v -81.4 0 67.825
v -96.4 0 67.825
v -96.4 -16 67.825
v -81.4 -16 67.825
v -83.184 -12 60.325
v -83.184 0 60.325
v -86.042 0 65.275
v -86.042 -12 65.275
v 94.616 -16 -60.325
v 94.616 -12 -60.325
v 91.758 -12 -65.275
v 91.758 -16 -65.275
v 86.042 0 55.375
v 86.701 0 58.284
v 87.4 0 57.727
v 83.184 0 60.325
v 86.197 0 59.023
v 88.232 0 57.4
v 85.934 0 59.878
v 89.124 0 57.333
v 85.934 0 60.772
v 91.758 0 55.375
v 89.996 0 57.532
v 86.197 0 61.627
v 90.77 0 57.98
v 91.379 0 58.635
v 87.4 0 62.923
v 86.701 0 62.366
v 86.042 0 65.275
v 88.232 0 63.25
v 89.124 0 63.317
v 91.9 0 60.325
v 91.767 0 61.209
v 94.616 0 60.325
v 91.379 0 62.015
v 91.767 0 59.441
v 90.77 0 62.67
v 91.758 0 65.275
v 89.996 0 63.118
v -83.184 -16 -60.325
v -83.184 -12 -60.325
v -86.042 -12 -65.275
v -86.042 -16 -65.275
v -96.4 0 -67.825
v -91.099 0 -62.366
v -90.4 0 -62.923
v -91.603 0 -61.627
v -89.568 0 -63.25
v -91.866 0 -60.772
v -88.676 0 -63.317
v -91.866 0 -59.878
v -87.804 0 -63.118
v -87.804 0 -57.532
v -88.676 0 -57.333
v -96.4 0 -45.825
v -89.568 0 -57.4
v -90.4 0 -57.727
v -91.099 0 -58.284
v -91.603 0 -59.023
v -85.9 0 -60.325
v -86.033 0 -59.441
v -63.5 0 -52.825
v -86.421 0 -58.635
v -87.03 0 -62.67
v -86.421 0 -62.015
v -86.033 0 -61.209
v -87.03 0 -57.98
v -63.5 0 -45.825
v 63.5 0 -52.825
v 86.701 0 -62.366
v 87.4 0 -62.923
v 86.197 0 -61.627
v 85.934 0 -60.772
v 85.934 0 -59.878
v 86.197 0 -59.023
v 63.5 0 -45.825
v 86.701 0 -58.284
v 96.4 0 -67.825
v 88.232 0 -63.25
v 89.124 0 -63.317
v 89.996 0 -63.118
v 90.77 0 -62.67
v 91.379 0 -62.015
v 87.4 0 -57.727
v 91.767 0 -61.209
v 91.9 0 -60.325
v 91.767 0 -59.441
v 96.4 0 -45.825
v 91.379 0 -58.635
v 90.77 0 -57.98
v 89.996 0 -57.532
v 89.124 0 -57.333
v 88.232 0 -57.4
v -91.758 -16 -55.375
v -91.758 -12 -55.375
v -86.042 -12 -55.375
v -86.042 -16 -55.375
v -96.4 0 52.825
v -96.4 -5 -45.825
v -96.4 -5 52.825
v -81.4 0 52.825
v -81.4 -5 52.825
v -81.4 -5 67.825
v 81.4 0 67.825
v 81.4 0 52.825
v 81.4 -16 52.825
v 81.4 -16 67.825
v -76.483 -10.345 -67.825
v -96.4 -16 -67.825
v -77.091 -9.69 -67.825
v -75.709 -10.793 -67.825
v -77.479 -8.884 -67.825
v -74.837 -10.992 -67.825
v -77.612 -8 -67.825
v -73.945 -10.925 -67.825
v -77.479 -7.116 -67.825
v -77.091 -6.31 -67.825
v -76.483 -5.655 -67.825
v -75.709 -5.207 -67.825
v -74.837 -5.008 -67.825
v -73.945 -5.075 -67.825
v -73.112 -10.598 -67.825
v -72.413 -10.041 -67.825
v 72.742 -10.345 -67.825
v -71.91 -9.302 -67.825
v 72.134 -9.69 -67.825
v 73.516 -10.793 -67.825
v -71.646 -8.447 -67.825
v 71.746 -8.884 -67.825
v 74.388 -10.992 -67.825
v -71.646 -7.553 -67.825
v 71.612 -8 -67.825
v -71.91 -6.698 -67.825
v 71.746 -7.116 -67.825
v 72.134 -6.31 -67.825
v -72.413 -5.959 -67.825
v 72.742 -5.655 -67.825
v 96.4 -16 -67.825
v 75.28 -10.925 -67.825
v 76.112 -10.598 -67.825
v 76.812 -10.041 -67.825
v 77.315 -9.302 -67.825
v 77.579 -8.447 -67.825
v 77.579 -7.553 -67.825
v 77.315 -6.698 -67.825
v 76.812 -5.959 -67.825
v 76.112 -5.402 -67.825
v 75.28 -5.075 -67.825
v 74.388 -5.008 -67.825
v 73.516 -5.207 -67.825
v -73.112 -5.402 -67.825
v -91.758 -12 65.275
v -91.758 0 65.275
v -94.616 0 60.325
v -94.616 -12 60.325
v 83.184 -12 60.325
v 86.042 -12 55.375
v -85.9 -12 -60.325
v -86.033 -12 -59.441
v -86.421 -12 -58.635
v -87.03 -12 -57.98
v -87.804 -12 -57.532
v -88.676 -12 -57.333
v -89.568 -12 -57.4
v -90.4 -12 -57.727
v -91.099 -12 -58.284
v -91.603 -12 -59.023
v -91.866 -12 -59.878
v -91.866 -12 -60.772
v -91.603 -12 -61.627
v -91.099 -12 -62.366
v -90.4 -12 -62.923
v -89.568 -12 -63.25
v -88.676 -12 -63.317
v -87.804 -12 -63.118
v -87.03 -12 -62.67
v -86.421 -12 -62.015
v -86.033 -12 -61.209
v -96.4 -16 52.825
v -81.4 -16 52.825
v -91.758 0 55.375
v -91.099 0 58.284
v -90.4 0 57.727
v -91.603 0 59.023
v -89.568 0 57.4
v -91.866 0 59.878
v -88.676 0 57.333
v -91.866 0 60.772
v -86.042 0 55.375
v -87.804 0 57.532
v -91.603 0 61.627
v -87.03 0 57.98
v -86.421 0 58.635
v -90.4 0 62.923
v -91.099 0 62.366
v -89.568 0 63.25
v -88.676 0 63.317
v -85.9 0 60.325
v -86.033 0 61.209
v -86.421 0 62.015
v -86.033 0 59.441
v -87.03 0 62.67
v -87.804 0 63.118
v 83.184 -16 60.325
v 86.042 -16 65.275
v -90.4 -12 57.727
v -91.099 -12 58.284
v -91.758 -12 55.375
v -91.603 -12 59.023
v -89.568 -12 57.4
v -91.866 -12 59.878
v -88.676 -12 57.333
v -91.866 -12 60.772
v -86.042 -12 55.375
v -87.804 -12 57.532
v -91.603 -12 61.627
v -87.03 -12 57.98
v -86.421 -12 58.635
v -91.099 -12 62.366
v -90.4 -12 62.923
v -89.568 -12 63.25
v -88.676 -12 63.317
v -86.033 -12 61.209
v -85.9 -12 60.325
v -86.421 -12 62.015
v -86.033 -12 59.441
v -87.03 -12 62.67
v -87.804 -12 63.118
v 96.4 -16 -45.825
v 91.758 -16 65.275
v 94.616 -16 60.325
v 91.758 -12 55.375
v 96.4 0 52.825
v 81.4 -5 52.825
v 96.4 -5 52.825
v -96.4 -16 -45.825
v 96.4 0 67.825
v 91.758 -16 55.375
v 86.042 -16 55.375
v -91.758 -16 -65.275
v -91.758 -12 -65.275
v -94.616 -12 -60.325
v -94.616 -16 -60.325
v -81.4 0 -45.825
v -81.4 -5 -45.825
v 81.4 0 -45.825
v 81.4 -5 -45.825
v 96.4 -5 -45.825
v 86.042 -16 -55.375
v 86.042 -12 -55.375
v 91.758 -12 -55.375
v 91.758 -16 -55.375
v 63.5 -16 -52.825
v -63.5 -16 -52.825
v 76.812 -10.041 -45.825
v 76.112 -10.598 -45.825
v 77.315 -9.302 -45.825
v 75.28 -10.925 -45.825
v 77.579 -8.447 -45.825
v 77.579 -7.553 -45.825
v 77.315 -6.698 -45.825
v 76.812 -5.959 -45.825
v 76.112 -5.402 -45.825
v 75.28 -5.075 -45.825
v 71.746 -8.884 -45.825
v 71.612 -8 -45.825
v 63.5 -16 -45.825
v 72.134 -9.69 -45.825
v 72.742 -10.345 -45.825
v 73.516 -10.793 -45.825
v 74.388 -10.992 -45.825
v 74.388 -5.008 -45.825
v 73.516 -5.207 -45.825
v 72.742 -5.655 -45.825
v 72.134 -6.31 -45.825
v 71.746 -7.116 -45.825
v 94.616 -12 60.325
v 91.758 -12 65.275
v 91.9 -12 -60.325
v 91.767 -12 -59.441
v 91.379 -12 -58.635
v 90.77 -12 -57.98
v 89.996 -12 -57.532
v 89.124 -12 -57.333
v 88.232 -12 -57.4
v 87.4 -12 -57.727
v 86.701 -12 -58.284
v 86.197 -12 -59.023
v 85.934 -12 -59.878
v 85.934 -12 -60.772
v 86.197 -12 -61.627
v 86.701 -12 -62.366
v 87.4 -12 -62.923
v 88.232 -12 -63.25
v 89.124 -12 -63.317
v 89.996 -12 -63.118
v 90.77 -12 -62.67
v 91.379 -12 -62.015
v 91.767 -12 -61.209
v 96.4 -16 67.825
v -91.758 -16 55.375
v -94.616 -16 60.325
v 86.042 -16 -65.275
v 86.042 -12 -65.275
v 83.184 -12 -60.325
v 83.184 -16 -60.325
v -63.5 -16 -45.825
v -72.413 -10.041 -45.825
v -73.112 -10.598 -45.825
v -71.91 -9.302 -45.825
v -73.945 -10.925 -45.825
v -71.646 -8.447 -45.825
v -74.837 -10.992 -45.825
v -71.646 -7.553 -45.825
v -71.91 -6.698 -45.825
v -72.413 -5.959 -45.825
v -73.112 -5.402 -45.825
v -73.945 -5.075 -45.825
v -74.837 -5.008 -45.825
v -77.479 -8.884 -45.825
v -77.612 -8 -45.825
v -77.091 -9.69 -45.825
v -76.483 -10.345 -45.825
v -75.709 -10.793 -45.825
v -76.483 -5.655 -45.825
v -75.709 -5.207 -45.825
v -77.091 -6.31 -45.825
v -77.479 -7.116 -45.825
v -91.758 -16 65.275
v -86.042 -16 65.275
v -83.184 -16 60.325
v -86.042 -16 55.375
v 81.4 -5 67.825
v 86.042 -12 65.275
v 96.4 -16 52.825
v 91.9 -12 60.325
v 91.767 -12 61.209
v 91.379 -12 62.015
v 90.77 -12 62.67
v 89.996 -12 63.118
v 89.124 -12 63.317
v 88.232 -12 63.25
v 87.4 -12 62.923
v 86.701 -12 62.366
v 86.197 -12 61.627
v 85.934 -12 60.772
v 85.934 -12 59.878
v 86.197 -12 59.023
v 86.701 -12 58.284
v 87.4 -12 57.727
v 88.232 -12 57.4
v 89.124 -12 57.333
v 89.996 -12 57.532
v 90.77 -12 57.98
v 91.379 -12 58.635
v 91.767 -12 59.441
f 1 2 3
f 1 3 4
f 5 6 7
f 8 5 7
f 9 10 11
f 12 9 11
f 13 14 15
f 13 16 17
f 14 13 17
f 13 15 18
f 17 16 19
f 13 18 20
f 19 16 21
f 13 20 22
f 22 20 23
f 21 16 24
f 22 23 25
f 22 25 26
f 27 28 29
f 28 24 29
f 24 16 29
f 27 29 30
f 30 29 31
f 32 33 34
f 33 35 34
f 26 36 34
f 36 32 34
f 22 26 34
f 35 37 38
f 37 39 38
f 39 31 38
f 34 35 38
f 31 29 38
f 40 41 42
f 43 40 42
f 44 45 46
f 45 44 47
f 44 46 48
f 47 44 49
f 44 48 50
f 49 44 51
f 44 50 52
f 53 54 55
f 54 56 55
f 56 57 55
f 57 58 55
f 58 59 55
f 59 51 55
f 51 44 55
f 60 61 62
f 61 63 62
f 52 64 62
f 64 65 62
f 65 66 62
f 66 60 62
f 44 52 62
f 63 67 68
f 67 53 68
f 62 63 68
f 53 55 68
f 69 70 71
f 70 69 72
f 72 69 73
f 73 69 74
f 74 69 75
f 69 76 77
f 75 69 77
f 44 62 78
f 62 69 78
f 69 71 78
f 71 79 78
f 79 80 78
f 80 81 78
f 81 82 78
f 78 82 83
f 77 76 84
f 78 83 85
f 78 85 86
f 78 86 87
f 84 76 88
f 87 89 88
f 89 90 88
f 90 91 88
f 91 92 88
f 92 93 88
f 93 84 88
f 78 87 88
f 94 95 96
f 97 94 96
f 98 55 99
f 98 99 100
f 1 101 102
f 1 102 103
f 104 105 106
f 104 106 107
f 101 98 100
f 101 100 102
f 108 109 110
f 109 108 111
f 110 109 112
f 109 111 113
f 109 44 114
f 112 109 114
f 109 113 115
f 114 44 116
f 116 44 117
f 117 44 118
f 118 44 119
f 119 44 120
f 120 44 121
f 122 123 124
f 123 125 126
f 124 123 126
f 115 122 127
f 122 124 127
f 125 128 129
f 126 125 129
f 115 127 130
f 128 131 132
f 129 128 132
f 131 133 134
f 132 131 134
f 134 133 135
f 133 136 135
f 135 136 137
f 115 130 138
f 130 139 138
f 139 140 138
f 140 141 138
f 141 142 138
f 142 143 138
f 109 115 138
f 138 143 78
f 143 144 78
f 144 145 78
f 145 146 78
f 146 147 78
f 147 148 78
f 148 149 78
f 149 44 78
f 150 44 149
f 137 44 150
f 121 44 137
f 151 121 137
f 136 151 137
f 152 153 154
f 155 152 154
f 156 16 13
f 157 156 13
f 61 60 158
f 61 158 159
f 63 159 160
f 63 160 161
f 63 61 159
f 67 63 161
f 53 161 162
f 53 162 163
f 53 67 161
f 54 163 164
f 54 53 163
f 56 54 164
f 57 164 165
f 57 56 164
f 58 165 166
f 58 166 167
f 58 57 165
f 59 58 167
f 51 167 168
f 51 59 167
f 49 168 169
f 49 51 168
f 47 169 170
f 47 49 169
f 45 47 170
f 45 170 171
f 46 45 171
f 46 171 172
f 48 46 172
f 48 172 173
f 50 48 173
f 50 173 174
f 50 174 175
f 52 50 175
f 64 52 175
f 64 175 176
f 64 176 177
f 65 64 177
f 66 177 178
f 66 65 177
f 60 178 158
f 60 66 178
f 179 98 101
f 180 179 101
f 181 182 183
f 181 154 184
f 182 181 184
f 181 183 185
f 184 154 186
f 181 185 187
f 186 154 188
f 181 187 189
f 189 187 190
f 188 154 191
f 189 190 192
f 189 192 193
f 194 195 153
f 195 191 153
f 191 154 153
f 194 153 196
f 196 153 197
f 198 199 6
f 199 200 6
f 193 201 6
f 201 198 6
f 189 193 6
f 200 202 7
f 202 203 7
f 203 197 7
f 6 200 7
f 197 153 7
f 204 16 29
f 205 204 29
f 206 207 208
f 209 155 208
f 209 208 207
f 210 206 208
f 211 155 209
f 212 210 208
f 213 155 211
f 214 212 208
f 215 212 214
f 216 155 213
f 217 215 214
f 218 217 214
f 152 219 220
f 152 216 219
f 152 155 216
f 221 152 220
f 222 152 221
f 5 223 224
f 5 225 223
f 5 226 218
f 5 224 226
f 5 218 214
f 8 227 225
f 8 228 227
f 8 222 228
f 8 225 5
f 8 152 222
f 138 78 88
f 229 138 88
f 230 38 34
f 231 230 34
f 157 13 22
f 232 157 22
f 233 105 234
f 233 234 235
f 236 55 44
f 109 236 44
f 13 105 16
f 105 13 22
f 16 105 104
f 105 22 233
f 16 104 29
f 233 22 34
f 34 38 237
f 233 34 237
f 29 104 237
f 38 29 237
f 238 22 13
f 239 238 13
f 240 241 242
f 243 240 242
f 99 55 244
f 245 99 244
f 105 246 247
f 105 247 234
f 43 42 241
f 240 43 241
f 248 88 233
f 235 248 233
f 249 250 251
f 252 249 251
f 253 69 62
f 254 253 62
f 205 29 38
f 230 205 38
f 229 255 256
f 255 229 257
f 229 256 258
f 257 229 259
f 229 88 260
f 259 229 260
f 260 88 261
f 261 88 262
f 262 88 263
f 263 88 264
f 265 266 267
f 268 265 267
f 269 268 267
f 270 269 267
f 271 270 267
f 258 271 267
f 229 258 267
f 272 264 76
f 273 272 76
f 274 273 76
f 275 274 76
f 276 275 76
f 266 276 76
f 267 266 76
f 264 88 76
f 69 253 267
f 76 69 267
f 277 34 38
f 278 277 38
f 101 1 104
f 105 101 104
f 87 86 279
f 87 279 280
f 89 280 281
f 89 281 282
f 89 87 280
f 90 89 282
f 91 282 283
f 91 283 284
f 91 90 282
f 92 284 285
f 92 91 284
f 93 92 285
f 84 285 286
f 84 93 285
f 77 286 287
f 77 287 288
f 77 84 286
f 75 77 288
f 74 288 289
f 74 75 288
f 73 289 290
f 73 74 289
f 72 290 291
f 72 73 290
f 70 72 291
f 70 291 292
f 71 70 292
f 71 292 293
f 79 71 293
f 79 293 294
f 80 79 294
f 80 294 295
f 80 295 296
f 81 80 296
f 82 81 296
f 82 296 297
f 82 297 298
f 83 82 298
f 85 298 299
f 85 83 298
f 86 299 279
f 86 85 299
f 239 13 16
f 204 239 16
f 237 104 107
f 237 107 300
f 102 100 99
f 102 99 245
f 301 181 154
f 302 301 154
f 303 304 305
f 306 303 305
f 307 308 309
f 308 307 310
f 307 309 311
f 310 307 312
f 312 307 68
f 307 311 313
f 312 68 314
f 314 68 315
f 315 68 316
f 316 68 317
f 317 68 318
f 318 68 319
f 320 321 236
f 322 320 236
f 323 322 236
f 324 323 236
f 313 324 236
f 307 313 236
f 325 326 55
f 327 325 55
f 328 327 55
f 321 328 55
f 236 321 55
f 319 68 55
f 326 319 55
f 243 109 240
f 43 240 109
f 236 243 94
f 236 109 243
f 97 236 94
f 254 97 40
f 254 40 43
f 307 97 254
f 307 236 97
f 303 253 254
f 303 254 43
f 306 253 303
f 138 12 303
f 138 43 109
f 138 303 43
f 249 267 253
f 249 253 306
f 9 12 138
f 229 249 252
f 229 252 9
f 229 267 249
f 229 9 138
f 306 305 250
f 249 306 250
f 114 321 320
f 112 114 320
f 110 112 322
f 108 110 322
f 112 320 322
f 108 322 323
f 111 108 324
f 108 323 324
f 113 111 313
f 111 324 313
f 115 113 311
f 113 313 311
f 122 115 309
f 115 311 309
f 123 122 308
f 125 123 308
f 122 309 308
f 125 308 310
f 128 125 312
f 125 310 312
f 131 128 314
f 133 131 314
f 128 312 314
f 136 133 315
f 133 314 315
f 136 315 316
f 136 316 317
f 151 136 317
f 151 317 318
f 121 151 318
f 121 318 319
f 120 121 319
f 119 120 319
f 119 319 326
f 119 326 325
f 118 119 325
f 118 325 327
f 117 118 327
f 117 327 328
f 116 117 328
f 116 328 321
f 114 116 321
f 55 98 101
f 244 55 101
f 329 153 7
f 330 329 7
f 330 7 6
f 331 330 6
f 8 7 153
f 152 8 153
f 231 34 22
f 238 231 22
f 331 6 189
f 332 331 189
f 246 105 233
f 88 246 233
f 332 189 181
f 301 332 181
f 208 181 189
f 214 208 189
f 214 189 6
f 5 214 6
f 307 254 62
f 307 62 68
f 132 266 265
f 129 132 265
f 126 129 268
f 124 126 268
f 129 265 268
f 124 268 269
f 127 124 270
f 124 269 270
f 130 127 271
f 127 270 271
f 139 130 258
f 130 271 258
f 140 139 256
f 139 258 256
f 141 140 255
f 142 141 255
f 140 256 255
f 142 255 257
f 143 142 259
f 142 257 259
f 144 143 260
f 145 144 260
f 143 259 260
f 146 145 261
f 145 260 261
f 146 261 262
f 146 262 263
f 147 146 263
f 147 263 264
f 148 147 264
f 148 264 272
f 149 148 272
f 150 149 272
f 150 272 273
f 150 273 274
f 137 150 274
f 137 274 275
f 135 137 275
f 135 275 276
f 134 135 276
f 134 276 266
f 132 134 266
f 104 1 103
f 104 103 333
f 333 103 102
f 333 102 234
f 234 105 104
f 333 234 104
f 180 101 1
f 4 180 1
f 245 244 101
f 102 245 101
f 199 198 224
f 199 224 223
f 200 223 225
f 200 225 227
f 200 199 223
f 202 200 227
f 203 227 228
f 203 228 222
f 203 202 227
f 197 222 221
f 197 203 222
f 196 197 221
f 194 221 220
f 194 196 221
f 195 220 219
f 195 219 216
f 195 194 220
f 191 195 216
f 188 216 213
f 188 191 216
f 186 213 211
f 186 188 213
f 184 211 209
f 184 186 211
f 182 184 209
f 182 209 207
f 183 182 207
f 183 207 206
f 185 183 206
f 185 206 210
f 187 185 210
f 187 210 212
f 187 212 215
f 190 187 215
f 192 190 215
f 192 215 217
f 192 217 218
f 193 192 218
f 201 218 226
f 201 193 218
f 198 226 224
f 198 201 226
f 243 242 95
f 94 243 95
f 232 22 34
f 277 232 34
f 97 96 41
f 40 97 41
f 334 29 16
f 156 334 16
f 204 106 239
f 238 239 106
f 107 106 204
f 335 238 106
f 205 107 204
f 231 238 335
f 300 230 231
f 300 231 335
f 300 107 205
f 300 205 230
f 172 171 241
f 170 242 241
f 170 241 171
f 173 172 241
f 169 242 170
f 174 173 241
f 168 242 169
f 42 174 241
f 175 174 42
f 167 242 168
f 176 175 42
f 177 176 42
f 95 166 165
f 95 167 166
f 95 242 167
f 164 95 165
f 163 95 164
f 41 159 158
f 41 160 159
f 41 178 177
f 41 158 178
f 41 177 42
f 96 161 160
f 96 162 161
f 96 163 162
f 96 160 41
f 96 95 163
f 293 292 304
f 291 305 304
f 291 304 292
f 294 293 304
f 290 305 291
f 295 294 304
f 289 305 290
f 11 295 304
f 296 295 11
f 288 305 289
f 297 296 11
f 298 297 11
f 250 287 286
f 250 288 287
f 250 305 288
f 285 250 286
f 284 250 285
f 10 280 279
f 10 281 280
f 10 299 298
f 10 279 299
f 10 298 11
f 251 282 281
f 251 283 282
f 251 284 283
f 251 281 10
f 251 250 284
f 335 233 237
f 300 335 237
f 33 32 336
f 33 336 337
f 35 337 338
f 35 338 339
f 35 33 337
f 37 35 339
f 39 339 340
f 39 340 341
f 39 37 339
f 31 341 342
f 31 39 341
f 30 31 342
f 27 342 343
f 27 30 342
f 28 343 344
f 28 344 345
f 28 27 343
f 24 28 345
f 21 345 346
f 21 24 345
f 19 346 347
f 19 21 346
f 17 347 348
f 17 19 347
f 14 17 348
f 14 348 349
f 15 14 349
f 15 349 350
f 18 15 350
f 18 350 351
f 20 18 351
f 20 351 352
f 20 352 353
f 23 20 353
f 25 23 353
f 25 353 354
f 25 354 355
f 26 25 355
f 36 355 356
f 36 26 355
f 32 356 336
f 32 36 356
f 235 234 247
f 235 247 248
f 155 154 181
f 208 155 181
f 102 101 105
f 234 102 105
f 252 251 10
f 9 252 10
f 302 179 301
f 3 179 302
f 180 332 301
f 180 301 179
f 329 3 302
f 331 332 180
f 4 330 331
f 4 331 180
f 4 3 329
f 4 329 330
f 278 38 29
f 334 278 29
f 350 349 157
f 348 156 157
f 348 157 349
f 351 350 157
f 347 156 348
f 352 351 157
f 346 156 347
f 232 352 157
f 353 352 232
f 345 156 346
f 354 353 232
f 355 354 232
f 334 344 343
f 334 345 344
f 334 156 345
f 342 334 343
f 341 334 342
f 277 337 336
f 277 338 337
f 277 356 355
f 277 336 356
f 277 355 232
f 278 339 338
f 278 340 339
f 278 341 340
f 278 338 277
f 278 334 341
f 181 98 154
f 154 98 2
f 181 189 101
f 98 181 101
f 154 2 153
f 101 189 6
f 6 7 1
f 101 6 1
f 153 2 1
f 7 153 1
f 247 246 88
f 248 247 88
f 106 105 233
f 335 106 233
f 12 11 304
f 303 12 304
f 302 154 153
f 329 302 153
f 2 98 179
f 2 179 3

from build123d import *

# Parameters (mm, degrees)
F0_W     = 15
F0_H     = 15
F1_DEPTH = 16
F0_H_2   = 7
F0_W_2   = 17.9
F0_R     = 3
F2_DEPTH = 12
F0_H_3   = 98.65
F3_DEPTH = 5
F0_W_3   = 162.8
F6_D     = 6


with BuildPart() as f1:
    # F0 (on Front) → F1 (new body)
    with BuildSketch(Plane.XZ):
        with Locations((-88.9, 60.325)):
            Rectangle(F0_W, F0_H)
        Polygon((-83.184232335, 60.325), (-86.0421161675, 55.375), (-91.7578838325, 55.375), (-94.615767665, 60.325), (-91.7578838325, 65.275), (-86.0421161675, 65.275), align=None, mode=Mode.SUBTRACT)
    extrude(amount=F1_DEPTH)


with BuildPart() as f1b:
    # F0 (on Front) → F1, piece 2 (new body)
    with BuildSketch(Plane.XZ):
        with Locations((88.9, 60.325)):
            Rectangle(F0_W, F0_H)
        Polygon((94.615767665, 60.325), (91.7578838325, 55.375), (86.0421161675, 55.375), (83.184232335, 60.325), (86.0421161675, 65.275), (91.7578838325, 65.275), align=None, mode=Mode.SUBTRACT)
    extrude(amount=F1_DEPTH)


with BuildPart() as f1c:
    # F0 (on Front) → F1, piece 3 (new body)
    with BuildSketch(Plane.XZ):
        with Locations((-88.9, -49.325)):
            Rectangle(F0_W, F0_H_2)
        with Locations((-72.45, -49.325)):
            Rectangle(F0_W_2, F0_H_2)
        Polygon((-81.4, -52.825), (-96.4, -52.825), (-96.4, -67.825), (-85.725, -67.825), (-81.4, -67.825), align=None)
        Polygon((-94.615767665, -60.325), (-91.7578838325, -55.375), (-86.0421161675, -55.375), (-83.184232335, -60.325), (-86.0421161675, -65.275), (-91.7578838325, -65.275), align=None, mode=Mode.SUBTRACT)
        Polygon((-63.5, -52.825), (-81.4, -52.825), (-81.4, -67.825), (-63.5, -67.825), (63.5, -67.825), (70.725, -67.825), (81.4, -67.825), (81.4, -52.825), (63.5, -52.825), align=None)
        with Locations((88.9, -49.325)):
            Rectangle(F0_W, F0_H_2)
        with Locations((72.45, -49.325)):
            Rectangle(F0_W_2, F0_H_2)
        Polygon((96.4, -52.825), (81.4, -52.825), (81.4, -67.825), (85.725, -67.825), (96.4, -67.825), align=None)
        Polygon((83.184232335, -60.325), (86.0421161675, -55.375), (91.7578838325, -55.375), (94.615767665, -60.325), (91.7578838325, -65.275), (86.0421161675, -65.275), align=None, mode=Mode.SUBTRACT)
    extrude(amount=F1_DEPTH)

    # F0 (on Front) → F2 (join)
    with BuildSketch(Plane.XZ):
        Polygon((-86.0421161675, -55.375), (-91.7578838325, -55.375), (-94.615767665, -60.325), (-91.7578838325, -65.275), (-86.0421161675, -65.275), (-83.184232335, -60.325), align=None)
        with Locations((-88.9, -60.325)):
            Circle(F0_R, mode=Mode.SUBTRACT)
        Polygon((91.7578838325, -55.375), (86.0421161675, -55.375), (83.184232335, -60.325), (86.0421161675, -65.275), (91.7578838325, -65.275), (94.615767665, -60.325), align=None)
        with Locations((88.9, -60.325)):
            Circle(F0_R, mode=Mode.SUBTRACT)
    extrude(amount=F2_DEPTH)

    # F6 (through all)
    with Locations(Plane(origin=(0, 0, -67.825), x_dir=(1, 0, 0), z_dir=(0, 0, -1))):
        with Locations((74.6125, 8), (-74.6125, 8)):
            Hole(F6_D / 2)


with BuildPart() as f2:
    # F0 (on Front) → F2, piece 2 (new body)
    with BuildSketch(Plane.XZ):
        Polygon((-91.7578838325, 55.375), (-86.0421161675, 55.375), (-83.184232335, 60.325), (-86.0421161675, 65.275), (-91.7578838325, 65.275), (-94.615767665, 60.325), align=None)
        with Locations((-88.9, 60.325)):
            Circle(F0_R, mode=Mode.SUBTRACT)
    extrude(amount=F2_DEPTH)


with BuildPart() as f2b:
    # F0 (on Front) → F2, piece 3 (new body)
    with BuildSketch(Plane.XZ):
        Polygon((86.0421161675, 55.375), (91.7578838325, 55.375), (94.615767665, 60.325), (91.7578838325, 65.275), (86.0421161675, 65.275), (83.184232335, 60.325), align=None)
        with Locations((88.9, 60.325)):
            Circle(F0_R, mode=Mode.SUBTRACT)
    extrude(amount=F2_DEPTH)


with BuildPart() as f3:
    # F0 (on Front) → F3 (new body)
    with BuildSketch(Plane.XZ):
        with Locations((-88.9, 3.5)):
            Rectangle(F0_W, F0_H_3)
    extrude(amount=F3_DEPTH)


with BuildPart() as f3b:
    # F0 (on Front) → F3, piece 2 (new body)
    with BuildSketch(Plane.XZ):
        with Locations((0, 60.325)):
            Rectangle(F0_W_3, F0_H)
    extrude(amount=F3_DEPTH)


with BuildPart() as f3c:
    # F0 (on Front) → F3, piece 3 (new body)
    with BuildSketch(Plane.XZ):
        with Locations((88.9, 3.5)):
            Rectangle(F0_W, F0_H_3)
    extrude(amount=F3_DEPTH)


solid = Compound([f1.part, f1b.part, f1c.part, f2.part, f2b.part, f3.part, f3b.part, f3c.part])
